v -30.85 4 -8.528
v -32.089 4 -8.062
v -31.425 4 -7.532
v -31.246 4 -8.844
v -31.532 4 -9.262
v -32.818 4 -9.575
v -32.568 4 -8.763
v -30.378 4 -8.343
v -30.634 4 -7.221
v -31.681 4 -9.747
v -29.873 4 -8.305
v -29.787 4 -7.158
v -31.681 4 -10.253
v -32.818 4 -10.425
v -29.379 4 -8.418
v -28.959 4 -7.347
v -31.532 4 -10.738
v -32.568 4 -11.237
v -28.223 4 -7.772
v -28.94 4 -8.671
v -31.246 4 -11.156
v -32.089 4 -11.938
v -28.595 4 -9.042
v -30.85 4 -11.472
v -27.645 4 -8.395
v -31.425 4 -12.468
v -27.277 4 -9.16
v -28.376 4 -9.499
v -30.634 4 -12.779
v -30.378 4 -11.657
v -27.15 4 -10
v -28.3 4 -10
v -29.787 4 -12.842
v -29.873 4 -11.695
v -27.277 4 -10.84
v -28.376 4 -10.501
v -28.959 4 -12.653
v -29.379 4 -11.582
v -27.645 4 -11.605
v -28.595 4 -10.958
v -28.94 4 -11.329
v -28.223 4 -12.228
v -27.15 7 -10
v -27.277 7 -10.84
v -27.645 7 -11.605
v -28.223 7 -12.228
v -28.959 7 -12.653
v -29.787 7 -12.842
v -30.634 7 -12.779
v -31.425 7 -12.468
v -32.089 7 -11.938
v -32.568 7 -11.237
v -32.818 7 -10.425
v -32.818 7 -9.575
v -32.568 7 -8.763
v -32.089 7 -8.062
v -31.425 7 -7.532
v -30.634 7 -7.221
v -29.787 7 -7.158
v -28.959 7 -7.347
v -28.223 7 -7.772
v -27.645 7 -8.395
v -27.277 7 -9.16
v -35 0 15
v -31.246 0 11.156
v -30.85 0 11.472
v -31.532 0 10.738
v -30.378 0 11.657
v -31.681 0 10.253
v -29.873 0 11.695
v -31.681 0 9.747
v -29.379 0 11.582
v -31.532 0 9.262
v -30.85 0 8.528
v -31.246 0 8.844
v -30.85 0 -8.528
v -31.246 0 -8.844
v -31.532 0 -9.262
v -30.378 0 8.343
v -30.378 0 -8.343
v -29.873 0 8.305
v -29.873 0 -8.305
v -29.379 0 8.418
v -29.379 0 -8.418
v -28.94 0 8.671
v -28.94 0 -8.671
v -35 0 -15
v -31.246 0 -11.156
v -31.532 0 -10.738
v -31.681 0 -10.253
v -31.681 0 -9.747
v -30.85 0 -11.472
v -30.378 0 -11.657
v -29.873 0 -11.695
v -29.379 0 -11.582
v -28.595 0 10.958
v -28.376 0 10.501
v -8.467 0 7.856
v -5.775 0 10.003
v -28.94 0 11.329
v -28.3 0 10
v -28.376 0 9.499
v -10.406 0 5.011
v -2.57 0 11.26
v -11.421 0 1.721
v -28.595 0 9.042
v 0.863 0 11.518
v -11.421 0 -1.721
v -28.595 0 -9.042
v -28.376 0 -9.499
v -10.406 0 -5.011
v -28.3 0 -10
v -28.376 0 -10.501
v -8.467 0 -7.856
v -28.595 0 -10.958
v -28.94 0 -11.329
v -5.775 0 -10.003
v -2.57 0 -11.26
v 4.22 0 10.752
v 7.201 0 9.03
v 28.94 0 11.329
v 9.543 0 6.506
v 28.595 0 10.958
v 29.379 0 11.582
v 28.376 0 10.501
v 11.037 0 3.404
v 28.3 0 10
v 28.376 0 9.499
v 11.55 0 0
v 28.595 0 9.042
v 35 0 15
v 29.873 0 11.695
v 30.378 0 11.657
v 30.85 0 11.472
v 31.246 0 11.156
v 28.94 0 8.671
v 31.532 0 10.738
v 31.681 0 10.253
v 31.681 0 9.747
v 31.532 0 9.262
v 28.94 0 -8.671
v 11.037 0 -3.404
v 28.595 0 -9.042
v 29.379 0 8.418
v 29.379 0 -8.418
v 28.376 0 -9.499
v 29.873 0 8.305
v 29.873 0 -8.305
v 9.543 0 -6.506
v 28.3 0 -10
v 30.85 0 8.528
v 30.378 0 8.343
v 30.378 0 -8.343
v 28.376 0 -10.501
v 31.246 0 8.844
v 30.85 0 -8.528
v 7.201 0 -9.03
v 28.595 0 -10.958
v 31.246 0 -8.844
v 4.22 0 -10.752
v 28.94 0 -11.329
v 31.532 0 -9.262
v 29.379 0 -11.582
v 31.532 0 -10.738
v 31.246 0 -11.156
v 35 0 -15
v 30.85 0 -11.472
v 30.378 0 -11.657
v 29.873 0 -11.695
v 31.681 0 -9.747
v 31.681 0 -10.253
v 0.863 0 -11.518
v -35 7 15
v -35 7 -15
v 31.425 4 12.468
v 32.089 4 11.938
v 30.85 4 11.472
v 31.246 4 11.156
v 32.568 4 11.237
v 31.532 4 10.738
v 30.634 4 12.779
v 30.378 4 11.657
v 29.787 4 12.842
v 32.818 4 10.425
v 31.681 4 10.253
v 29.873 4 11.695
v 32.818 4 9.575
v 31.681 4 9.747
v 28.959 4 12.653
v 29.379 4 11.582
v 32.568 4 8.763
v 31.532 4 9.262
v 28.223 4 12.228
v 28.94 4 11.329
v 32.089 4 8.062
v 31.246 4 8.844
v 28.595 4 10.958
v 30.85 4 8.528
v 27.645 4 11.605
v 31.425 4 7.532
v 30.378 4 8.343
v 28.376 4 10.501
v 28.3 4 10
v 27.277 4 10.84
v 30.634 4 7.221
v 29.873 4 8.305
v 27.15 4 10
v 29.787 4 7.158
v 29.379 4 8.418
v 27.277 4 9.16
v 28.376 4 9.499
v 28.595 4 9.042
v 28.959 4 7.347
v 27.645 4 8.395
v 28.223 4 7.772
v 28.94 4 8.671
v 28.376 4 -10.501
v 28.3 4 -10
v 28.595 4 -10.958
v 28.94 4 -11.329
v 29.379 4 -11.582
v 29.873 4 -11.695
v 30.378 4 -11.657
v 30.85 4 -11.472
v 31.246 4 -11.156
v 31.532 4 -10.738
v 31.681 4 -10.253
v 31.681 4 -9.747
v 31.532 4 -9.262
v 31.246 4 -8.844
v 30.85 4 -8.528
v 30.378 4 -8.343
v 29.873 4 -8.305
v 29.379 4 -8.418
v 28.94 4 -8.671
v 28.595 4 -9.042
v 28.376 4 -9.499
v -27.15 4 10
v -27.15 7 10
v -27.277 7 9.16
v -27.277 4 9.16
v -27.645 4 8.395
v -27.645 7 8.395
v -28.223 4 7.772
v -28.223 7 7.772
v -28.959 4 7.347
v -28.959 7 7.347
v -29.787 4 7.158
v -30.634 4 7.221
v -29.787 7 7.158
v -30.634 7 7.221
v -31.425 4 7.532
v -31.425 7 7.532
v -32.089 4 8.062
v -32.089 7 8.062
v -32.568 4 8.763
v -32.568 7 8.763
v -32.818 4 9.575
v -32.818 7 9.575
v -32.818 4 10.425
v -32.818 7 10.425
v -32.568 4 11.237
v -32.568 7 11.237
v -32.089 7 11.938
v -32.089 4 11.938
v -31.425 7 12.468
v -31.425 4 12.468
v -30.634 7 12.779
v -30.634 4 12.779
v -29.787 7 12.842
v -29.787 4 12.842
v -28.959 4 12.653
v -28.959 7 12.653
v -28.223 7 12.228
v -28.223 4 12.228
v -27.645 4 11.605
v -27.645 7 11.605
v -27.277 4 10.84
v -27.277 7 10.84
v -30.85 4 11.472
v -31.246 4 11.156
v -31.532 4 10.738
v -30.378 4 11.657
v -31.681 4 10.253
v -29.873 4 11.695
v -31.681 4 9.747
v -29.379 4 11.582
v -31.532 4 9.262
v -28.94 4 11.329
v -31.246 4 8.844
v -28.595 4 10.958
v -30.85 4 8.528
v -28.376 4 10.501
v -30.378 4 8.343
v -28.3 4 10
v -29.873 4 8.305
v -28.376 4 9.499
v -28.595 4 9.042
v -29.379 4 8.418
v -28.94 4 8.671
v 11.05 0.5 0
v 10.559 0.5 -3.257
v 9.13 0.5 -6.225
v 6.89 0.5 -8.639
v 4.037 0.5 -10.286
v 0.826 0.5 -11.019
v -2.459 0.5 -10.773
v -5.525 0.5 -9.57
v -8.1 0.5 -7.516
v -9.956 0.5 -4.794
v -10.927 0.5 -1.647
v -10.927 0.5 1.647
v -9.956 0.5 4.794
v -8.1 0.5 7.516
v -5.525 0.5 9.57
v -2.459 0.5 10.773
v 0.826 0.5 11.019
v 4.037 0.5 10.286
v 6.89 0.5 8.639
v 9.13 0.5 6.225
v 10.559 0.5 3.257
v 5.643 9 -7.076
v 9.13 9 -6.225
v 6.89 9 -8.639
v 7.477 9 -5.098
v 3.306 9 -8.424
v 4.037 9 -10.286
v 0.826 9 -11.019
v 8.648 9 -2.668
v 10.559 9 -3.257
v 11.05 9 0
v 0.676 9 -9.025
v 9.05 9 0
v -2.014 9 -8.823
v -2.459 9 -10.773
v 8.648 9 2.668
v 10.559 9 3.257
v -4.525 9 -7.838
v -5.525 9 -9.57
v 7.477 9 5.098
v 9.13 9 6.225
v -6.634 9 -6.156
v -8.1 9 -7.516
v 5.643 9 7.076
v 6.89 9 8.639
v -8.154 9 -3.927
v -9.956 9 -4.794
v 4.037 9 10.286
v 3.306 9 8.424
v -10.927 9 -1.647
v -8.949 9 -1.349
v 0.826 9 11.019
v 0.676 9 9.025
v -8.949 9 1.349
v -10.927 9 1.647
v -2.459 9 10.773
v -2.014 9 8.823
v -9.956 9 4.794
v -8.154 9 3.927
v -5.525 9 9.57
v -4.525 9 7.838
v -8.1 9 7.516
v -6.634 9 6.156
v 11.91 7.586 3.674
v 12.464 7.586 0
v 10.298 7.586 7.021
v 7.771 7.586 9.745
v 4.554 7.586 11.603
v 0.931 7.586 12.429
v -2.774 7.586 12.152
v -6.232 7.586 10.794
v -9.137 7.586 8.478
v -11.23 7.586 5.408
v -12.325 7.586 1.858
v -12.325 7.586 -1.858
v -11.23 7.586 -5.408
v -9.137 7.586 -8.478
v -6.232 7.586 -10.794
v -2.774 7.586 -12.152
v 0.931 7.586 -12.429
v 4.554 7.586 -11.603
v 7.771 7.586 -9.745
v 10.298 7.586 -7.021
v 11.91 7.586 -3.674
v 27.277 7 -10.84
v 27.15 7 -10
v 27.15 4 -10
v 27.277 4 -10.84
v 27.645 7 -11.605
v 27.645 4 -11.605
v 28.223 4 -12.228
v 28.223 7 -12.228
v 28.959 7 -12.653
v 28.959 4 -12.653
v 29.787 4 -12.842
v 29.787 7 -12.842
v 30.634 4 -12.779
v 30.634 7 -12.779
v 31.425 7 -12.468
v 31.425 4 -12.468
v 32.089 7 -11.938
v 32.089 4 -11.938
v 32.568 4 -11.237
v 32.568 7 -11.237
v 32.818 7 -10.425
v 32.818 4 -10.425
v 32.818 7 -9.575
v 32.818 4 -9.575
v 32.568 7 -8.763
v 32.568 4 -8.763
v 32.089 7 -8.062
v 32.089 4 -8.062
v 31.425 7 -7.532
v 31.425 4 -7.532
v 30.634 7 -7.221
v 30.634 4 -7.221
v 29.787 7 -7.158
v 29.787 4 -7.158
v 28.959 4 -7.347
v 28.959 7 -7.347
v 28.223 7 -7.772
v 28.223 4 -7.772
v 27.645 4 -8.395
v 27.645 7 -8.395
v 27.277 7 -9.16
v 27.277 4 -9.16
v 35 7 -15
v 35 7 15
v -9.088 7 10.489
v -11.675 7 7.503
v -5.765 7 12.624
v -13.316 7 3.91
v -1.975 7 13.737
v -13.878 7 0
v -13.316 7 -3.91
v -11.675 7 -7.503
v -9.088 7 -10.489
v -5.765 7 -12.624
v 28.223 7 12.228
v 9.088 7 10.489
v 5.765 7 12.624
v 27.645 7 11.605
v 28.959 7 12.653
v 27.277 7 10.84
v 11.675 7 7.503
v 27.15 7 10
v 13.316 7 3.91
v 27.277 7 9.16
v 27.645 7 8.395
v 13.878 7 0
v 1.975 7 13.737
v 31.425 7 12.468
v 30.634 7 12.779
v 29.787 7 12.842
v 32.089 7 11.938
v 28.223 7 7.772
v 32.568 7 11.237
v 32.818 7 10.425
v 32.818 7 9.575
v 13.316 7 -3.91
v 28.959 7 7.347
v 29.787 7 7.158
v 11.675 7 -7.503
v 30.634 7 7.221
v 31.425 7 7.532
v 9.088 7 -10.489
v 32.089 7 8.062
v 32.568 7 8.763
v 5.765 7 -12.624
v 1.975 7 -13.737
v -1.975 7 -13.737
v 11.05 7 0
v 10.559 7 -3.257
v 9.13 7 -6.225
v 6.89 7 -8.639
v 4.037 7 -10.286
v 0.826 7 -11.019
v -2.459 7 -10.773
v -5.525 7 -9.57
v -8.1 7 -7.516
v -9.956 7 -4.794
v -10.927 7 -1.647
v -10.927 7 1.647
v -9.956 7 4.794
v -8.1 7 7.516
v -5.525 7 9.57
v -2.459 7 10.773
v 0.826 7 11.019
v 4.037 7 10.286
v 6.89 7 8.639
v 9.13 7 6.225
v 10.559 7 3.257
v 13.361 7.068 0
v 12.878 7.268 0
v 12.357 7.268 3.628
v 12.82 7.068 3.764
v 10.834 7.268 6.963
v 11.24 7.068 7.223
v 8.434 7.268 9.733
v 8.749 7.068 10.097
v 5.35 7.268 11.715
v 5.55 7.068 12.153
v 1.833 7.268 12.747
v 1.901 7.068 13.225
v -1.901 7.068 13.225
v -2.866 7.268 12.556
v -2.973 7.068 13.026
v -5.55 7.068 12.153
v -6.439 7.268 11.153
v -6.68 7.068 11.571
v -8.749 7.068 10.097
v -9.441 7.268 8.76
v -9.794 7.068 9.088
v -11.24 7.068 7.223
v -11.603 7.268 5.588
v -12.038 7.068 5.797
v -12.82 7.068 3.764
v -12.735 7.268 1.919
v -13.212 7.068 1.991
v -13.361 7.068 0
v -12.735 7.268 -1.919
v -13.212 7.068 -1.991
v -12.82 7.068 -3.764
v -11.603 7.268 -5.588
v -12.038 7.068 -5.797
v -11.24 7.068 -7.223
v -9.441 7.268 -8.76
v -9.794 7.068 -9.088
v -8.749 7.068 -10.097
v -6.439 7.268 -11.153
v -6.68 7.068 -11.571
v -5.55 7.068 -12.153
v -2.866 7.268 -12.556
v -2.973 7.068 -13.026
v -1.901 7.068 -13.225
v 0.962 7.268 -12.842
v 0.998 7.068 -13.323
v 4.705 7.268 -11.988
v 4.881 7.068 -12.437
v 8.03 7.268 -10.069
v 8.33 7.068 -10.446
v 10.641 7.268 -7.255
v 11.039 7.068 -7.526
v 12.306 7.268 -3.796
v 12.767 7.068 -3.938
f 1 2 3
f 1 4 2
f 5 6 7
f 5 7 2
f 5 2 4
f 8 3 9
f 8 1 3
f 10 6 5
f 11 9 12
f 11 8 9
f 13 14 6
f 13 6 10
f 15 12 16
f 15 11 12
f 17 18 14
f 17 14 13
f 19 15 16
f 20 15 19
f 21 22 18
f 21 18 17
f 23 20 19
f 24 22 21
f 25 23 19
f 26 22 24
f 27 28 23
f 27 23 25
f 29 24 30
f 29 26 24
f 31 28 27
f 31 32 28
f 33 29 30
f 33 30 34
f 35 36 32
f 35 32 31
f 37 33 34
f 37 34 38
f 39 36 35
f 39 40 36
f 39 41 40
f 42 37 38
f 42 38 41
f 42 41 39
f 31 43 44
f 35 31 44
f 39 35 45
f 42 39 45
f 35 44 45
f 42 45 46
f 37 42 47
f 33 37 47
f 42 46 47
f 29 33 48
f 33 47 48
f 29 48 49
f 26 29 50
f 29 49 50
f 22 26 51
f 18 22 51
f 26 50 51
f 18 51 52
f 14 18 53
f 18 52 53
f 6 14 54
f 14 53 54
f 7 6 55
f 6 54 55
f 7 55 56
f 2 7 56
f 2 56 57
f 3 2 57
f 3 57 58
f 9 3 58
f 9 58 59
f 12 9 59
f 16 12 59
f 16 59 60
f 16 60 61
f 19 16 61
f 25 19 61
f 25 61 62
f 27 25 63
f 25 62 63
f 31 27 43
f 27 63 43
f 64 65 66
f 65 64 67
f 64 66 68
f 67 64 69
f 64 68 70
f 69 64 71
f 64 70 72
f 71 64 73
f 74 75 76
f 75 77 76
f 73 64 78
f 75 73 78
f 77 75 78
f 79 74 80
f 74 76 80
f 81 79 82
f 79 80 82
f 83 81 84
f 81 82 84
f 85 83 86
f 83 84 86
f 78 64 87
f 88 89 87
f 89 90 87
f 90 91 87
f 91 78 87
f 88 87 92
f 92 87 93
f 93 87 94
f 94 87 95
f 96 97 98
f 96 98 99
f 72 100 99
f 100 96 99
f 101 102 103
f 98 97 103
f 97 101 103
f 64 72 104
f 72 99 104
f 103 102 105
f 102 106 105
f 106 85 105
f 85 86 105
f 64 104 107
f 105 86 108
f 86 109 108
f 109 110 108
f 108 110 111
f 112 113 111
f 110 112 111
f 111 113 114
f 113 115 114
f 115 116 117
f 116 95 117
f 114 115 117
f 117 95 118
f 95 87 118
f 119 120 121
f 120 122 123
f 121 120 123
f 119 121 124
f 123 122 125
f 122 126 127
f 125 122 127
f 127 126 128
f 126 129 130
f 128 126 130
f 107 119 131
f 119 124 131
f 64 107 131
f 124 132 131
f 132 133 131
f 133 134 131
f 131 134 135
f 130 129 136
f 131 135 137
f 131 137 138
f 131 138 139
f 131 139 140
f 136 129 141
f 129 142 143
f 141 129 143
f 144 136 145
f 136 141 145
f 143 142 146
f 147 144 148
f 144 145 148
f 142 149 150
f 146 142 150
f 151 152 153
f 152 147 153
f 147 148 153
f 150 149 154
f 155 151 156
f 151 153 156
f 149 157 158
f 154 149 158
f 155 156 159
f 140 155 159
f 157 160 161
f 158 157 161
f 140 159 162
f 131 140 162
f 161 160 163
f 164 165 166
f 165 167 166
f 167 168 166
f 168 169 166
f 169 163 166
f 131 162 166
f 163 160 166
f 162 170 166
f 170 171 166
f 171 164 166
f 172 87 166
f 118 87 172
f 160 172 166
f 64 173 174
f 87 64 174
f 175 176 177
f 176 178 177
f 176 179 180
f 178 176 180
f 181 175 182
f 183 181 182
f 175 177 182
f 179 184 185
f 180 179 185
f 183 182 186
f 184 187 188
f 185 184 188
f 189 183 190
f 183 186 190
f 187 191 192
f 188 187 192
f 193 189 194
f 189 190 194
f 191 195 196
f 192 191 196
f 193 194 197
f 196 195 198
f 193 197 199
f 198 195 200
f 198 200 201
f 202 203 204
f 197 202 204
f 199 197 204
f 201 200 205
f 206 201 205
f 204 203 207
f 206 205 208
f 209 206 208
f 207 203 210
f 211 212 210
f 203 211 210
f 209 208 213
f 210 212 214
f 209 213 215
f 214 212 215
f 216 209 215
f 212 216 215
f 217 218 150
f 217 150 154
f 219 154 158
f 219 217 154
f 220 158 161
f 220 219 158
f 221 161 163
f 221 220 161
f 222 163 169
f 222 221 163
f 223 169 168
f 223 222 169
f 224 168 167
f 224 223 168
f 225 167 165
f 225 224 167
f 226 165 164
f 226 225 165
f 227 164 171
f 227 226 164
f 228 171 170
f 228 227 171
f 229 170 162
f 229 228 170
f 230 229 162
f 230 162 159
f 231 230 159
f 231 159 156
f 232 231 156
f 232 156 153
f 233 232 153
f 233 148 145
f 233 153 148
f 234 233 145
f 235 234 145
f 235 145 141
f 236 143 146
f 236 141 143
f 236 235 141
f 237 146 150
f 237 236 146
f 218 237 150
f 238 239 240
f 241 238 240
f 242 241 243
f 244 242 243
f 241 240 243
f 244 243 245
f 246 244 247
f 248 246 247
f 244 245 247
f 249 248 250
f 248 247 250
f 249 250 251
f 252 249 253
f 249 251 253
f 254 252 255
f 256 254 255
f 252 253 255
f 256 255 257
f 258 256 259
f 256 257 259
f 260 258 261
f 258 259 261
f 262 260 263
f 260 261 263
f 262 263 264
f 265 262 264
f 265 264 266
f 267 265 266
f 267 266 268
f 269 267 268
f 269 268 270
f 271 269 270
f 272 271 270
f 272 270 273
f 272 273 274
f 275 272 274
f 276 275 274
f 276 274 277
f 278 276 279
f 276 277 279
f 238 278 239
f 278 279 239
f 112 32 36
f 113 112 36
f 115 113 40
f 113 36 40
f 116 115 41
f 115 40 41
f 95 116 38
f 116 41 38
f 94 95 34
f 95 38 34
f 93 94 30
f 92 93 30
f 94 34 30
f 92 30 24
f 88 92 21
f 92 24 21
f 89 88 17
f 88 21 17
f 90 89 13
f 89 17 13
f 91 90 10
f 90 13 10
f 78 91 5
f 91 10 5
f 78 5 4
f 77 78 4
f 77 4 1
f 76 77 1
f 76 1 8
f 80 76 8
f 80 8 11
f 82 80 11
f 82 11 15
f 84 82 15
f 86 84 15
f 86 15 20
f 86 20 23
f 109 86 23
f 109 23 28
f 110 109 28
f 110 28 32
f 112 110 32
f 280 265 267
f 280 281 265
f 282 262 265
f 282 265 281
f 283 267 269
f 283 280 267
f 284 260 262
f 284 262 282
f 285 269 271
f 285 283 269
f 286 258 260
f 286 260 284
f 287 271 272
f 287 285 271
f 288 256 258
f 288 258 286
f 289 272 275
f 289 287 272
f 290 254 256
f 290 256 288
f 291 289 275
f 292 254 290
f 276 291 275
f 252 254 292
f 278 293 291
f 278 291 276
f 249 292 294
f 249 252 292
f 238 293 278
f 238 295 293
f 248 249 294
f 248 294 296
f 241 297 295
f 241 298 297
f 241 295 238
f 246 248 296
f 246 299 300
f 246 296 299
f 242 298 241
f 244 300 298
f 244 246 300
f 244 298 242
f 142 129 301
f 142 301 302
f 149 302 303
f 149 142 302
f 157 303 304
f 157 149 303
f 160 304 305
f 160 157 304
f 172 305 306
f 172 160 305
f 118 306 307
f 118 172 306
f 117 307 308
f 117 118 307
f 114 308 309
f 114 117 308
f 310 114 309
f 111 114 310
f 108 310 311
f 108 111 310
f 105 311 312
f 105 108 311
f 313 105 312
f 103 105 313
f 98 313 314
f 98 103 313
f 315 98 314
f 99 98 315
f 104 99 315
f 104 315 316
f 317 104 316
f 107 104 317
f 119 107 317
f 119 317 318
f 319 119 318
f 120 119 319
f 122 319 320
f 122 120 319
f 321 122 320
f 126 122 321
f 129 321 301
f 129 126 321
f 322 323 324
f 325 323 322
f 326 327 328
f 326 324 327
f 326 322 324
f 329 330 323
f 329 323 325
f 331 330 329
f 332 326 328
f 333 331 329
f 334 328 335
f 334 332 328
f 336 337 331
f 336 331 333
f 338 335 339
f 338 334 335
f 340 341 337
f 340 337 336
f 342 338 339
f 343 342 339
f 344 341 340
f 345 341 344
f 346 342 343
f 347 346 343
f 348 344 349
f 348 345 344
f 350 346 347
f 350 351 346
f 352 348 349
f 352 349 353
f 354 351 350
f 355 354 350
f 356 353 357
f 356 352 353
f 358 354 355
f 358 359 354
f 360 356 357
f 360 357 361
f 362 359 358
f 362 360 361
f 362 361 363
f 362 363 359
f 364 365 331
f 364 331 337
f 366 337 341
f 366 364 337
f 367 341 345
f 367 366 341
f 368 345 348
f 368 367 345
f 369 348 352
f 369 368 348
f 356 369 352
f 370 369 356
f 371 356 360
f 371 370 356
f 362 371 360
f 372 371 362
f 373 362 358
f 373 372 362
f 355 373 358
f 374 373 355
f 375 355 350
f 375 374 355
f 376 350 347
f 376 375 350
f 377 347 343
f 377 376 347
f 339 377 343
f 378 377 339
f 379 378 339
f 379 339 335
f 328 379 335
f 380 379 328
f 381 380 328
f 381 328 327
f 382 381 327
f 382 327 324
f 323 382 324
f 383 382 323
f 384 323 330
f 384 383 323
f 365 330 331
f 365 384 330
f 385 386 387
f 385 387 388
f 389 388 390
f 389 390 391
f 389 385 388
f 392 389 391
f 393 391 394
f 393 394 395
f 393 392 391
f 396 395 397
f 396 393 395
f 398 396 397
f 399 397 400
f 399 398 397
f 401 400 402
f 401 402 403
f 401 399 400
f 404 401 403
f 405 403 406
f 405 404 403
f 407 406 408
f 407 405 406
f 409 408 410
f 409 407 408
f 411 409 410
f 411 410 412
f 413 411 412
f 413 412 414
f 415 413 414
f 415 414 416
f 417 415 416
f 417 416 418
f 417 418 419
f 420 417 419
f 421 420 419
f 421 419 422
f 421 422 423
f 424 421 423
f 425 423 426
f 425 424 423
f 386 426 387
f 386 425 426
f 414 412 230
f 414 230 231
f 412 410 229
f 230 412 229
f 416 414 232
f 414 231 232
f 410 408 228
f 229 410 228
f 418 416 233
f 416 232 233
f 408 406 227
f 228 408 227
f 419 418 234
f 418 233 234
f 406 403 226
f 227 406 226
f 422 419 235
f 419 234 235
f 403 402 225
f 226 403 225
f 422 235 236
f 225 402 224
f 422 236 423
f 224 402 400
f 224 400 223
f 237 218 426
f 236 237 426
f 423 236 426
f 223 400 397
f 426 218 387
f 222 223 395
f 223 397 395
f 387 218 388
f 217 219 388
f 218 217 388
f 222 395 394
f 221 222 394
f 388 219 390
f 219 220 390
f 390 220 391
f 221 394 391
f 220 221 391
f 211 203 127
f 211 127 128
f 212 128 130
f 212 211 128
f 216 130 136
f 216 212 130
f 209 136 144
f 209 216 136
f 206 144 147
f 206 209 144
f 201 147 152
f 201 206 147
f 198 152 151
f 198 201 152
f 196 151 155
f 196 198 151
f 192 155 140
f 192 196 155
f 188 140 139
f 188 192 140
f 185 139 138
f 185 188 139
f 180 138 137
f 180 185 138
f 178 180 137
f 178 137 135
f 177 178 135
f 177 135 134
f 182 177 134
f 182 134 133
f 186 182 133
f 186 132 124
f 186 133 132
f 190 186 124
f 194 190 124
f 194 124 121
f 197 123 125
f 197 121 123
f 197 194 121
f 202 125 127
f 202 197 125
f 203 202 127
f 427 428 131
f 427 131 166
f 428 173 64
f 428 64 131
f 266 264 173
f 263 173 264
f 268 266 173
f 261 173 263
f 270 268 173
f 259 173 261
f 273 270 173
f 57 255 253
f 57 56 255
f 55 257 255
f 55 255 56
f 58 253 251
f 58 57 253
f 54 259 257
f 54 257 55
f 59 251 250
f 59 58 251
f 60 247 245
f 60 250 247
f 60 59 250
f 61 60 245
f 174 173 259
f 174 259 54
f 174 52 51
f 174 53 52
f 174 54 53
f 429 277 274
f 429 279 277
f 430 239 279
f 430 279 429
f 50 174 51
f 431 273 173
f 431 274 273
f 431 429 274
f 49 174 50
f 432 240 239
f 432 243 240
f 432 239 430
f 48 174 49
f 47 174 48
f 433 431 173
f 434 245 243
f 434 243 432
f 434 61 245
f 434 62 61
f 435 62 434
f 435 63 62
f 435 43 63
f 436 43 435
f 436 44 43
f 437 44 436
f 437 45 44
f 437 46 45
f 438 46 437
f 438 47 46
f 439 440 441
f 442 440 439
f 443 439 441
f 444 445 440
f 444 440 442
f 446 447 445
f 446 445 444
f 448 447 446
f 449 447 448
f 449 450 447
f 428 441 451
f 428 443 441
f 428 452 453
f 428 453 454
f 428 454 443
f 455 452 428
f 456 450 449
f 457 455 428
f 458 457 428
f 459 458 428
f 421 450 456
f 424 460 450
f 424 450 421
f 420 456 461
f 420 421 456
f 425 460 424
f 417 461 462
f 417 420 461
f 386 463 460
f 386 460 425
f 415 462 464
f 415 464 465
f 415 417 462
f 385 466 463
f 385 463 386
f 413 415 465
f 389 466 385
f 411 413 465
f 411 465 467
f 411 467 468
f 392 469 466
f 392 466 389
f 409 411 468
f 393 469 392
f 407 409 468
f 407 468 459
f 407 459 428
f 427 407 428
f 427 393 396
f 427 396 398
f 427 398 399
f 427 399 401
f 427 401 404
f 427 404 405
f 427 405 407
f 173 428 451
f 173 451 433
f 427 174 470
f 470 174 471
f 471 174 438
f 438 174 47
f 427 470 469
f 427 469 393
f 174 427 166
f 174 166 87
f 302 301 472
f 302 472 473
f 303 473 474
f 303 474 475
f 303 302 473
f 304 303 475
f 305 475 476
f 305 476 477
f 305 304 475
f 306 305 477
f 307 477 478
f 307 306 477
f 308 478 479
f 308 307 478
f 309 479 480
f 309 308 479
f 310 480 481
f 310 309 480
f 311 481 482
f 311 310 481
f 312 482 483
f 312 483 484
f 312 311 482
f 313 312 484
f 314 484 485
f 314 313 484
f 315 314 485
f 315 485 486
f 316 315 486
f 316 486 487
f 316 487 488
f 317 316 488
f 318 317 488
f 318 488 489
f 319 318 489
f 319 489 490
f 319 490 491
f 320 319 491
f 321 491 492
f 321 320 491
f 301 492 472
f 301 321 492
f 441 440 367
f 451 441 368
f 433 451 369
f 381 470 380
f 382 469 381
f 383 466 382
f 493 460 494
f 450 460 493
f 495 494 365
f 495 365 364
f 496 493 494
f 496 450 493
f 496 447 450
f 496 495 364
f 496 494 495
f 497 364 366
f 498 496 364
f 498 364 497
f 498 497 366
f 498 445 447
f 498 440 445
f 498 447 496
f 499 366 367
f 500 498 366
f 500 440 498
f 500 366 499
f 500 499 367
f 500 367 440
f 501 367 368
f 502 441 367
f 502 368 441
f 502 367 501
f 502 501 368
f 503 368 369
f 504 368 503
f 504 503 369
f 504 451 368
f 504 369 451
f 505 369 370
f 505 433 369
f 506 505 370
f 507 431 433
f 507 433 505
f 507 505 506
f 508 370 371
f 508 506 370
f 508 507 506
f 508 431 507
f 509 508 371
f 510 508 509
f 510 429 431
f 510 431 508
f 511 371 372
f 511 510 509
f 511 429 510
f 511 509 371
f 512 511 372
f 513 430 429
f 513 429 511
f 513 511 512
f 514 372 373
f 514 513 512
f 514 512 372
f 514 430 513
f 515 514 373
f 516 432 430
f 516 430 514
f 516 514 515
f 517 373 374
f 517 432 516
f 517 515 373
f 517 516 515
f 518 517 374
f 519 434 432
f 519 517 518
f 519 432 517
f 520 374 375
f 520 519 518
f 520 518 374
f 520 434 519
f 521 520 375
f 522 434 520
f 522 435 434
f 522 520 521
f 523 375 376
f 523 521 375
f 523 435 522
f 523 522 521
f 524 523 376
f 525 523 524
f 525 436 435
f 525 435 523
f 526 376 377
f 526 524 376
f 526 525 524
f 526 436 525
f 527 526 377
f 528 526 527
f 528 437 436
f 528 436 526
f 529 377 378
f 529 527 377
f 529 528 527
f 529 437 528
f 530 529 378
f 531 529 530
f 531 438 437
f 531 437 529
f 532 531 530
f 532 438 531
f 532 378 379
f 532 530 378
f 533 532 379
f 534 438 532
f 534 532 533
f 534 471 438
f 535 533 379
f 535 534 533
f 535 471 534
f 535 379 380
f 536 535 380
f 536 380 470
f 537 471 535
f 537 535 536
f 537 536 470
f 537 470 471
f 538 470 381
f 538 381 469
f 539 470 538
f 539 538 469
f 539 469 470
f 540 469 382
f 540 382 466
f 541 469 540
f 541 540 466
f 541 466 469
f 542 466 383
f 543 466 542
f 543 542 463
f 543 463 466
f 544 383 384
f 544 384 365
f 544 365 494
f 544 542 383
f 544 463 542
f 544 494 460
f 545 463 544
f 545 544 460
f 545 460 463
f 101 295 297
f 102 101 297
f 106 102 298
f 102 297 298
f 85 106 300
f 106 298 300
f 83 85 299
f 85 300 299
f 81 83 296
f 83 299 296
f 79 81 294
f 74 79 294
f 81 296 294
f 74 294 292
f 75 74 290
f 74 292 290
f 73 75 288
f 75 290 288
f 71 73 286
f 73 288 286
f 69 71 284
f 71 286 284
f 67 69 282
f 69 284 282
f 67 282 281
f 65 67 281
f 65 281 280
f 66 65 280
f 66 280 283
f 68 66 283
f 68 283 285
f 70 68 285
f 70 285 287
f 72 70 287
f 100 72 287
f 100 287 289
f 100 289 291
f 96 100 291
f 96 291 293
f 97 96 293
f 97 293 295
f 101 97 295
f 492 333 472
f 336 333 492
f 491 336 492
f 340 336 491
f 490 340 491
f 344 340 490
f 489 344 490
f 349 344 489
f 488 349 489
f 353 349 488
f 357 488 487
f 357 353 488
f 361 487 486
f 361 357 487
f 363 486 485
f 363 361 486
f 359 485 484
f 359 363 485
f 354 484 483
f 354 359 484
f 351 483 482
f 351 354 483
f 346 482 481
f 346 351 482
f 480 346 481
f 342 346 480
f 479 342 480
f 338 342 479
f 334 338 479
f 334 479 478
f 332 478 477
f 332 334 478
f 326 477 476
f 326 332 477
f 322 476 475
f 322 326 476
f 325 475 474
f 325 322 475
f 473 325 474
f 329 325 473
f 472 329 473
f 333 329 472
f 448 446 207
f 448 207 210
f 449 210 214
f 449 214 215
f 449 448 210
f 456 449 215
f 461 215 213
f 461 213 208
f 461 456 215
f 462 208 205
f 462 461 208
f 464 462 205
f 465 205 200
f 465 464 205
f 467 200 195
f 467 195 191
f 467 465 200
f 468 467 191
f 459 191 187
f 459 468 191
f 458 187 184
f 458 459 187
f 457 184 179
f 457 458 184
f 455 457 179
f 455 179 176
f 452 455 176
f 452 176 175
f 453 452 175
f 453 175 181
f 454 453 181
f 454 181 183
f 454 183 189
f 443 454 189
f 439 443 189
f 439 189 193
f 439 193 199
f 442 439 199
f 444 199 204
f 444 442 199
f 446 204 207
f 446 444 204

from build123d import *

# Parameters (mm, degrees)
SKETCH1_R           = 15
SKETCH1_R_2         = 11.05
BOSS_EXTRUDE1_DEPTH = 7
BOSS_EXTRUDE2_DEPTH = 7
SKETCH3_R           = 1.7
CUT_EXTRUDE1_DEPTH  = 8
SKETCH4_R           = 2.85
CUT_EXTRUDE2_DEPTH  = 3
FILLET2_R           = 2
CHAMFER1_SIZE       = 0.5


with BuildPart() as part:
    # Sketch1 → Boss-Extrude1 (new body)
    with BuildSketch(Plane(origin=(0, 0, 0), x_dir=(1, 0, 0), z_dir=(0, 1, 0))):
        Circle(SKETCH1_R)
        Circle(SKETCH1_R_2, mode=Mode.SUBTRACT)
    extrude(amount=BOSS_EXTRUDE1_DEPTH)

    # Sketch2 → Boss-Extrude2 (add)
    with BuildSketch(Plane(origin=(0, 7, 0), x_dir=(1, 0, 0), z_dir=(0, 1, 0))):
        with BuildLine():
            Line((0, -15), (-35, -15))
            Line((-35, -15), (-35, 15))
            Line((-35, 15), (0, 15))
            ThreePointArc((0, 15), (-15, 0), (0, -15))
        make_face()
    boss_extrude2 = extrude(amount=-BOSS_EXTRUDE2_DEPTH)

    # Sketch3 → Cut-Extrude1 (cut, through all)
    with BuildSketch(Plane(origin=(0, 7, 0), x_dir=(1, 0, 0), z_dir=(0, 1, 0))):
        with Locations((-30, 10)):
            Circle(SKETCH3_R)
        with Locations((-30, -10)):
            Circle(SKETCH3_R)
    cut_extrude1 = extrude(amount=-CUT_EXTRUDE1_DEPTH, mode=Mode.SUBTRACT)

    # Sketch4 → Cut-Extrude2 (cut)
    with BuildSketch(Plane(origin=(0, 7, 0), x_dir=(1, 0, 0), z_dir=(0, 1, 0))):
        with Locations((-30, 10)):
            Circle(SKETCH4_R)
        with Locations((-30, -10)):
            Circle(SKETCH4_R)
    cut_extrude2 = extrude(amount=-CUT_EXTRUDE2_DEPTH, mode=Mode.SUBTRACT)

    # Mirror1: Boss-Extrude2, Cut-Extrude1, Cut-Extrude2 across plane
    add(boss_extrude2.mirror(Plane(origin=(0, 0, 0), x_dir=(0, 0, 1), z_dir=(1, 0, 0))))
    add(cut_extrude1.mirror(Plane(origin=(0, 0, 0), x_dir=(0, 0, 1), z_dir=(1, 0, 0))), mode=Mode.SUBTRACT)
    add(cut_extrude2.mirror(Plane(origin=(0, 0, 0), x_dir=(0, 0, 1), z_dir=(1, 0, 0))), mode=Mode.SUBTRACT)

    # Sketch6 → Revolve1 (revolve)
    with BuildSketch(Plane.XY):
        Polygon((11.05, 7), (9.05, 9), (11.05, 9), (13.05, 7), align=None)
    revolve(axis=Axis((0, 7, 0), (0, -1, 0)))

    # Fillet2
    fillet2_edges = [part.edges().sort_by_distance(p)[0] for p in [
        (-13.05, 7, 0),
    ]]
    fillet(fillet2_edges, radius=FILLET2_R)

    # Chamfer1
    chamfer1_edges = [part.edges().sort_by_distance(p)[0] for p in [
        (-11.05, 0, 0),
    ]]
    chamfer(chamfer1_edges, length=CHAMFER1_SIZE)


solid = part.part
